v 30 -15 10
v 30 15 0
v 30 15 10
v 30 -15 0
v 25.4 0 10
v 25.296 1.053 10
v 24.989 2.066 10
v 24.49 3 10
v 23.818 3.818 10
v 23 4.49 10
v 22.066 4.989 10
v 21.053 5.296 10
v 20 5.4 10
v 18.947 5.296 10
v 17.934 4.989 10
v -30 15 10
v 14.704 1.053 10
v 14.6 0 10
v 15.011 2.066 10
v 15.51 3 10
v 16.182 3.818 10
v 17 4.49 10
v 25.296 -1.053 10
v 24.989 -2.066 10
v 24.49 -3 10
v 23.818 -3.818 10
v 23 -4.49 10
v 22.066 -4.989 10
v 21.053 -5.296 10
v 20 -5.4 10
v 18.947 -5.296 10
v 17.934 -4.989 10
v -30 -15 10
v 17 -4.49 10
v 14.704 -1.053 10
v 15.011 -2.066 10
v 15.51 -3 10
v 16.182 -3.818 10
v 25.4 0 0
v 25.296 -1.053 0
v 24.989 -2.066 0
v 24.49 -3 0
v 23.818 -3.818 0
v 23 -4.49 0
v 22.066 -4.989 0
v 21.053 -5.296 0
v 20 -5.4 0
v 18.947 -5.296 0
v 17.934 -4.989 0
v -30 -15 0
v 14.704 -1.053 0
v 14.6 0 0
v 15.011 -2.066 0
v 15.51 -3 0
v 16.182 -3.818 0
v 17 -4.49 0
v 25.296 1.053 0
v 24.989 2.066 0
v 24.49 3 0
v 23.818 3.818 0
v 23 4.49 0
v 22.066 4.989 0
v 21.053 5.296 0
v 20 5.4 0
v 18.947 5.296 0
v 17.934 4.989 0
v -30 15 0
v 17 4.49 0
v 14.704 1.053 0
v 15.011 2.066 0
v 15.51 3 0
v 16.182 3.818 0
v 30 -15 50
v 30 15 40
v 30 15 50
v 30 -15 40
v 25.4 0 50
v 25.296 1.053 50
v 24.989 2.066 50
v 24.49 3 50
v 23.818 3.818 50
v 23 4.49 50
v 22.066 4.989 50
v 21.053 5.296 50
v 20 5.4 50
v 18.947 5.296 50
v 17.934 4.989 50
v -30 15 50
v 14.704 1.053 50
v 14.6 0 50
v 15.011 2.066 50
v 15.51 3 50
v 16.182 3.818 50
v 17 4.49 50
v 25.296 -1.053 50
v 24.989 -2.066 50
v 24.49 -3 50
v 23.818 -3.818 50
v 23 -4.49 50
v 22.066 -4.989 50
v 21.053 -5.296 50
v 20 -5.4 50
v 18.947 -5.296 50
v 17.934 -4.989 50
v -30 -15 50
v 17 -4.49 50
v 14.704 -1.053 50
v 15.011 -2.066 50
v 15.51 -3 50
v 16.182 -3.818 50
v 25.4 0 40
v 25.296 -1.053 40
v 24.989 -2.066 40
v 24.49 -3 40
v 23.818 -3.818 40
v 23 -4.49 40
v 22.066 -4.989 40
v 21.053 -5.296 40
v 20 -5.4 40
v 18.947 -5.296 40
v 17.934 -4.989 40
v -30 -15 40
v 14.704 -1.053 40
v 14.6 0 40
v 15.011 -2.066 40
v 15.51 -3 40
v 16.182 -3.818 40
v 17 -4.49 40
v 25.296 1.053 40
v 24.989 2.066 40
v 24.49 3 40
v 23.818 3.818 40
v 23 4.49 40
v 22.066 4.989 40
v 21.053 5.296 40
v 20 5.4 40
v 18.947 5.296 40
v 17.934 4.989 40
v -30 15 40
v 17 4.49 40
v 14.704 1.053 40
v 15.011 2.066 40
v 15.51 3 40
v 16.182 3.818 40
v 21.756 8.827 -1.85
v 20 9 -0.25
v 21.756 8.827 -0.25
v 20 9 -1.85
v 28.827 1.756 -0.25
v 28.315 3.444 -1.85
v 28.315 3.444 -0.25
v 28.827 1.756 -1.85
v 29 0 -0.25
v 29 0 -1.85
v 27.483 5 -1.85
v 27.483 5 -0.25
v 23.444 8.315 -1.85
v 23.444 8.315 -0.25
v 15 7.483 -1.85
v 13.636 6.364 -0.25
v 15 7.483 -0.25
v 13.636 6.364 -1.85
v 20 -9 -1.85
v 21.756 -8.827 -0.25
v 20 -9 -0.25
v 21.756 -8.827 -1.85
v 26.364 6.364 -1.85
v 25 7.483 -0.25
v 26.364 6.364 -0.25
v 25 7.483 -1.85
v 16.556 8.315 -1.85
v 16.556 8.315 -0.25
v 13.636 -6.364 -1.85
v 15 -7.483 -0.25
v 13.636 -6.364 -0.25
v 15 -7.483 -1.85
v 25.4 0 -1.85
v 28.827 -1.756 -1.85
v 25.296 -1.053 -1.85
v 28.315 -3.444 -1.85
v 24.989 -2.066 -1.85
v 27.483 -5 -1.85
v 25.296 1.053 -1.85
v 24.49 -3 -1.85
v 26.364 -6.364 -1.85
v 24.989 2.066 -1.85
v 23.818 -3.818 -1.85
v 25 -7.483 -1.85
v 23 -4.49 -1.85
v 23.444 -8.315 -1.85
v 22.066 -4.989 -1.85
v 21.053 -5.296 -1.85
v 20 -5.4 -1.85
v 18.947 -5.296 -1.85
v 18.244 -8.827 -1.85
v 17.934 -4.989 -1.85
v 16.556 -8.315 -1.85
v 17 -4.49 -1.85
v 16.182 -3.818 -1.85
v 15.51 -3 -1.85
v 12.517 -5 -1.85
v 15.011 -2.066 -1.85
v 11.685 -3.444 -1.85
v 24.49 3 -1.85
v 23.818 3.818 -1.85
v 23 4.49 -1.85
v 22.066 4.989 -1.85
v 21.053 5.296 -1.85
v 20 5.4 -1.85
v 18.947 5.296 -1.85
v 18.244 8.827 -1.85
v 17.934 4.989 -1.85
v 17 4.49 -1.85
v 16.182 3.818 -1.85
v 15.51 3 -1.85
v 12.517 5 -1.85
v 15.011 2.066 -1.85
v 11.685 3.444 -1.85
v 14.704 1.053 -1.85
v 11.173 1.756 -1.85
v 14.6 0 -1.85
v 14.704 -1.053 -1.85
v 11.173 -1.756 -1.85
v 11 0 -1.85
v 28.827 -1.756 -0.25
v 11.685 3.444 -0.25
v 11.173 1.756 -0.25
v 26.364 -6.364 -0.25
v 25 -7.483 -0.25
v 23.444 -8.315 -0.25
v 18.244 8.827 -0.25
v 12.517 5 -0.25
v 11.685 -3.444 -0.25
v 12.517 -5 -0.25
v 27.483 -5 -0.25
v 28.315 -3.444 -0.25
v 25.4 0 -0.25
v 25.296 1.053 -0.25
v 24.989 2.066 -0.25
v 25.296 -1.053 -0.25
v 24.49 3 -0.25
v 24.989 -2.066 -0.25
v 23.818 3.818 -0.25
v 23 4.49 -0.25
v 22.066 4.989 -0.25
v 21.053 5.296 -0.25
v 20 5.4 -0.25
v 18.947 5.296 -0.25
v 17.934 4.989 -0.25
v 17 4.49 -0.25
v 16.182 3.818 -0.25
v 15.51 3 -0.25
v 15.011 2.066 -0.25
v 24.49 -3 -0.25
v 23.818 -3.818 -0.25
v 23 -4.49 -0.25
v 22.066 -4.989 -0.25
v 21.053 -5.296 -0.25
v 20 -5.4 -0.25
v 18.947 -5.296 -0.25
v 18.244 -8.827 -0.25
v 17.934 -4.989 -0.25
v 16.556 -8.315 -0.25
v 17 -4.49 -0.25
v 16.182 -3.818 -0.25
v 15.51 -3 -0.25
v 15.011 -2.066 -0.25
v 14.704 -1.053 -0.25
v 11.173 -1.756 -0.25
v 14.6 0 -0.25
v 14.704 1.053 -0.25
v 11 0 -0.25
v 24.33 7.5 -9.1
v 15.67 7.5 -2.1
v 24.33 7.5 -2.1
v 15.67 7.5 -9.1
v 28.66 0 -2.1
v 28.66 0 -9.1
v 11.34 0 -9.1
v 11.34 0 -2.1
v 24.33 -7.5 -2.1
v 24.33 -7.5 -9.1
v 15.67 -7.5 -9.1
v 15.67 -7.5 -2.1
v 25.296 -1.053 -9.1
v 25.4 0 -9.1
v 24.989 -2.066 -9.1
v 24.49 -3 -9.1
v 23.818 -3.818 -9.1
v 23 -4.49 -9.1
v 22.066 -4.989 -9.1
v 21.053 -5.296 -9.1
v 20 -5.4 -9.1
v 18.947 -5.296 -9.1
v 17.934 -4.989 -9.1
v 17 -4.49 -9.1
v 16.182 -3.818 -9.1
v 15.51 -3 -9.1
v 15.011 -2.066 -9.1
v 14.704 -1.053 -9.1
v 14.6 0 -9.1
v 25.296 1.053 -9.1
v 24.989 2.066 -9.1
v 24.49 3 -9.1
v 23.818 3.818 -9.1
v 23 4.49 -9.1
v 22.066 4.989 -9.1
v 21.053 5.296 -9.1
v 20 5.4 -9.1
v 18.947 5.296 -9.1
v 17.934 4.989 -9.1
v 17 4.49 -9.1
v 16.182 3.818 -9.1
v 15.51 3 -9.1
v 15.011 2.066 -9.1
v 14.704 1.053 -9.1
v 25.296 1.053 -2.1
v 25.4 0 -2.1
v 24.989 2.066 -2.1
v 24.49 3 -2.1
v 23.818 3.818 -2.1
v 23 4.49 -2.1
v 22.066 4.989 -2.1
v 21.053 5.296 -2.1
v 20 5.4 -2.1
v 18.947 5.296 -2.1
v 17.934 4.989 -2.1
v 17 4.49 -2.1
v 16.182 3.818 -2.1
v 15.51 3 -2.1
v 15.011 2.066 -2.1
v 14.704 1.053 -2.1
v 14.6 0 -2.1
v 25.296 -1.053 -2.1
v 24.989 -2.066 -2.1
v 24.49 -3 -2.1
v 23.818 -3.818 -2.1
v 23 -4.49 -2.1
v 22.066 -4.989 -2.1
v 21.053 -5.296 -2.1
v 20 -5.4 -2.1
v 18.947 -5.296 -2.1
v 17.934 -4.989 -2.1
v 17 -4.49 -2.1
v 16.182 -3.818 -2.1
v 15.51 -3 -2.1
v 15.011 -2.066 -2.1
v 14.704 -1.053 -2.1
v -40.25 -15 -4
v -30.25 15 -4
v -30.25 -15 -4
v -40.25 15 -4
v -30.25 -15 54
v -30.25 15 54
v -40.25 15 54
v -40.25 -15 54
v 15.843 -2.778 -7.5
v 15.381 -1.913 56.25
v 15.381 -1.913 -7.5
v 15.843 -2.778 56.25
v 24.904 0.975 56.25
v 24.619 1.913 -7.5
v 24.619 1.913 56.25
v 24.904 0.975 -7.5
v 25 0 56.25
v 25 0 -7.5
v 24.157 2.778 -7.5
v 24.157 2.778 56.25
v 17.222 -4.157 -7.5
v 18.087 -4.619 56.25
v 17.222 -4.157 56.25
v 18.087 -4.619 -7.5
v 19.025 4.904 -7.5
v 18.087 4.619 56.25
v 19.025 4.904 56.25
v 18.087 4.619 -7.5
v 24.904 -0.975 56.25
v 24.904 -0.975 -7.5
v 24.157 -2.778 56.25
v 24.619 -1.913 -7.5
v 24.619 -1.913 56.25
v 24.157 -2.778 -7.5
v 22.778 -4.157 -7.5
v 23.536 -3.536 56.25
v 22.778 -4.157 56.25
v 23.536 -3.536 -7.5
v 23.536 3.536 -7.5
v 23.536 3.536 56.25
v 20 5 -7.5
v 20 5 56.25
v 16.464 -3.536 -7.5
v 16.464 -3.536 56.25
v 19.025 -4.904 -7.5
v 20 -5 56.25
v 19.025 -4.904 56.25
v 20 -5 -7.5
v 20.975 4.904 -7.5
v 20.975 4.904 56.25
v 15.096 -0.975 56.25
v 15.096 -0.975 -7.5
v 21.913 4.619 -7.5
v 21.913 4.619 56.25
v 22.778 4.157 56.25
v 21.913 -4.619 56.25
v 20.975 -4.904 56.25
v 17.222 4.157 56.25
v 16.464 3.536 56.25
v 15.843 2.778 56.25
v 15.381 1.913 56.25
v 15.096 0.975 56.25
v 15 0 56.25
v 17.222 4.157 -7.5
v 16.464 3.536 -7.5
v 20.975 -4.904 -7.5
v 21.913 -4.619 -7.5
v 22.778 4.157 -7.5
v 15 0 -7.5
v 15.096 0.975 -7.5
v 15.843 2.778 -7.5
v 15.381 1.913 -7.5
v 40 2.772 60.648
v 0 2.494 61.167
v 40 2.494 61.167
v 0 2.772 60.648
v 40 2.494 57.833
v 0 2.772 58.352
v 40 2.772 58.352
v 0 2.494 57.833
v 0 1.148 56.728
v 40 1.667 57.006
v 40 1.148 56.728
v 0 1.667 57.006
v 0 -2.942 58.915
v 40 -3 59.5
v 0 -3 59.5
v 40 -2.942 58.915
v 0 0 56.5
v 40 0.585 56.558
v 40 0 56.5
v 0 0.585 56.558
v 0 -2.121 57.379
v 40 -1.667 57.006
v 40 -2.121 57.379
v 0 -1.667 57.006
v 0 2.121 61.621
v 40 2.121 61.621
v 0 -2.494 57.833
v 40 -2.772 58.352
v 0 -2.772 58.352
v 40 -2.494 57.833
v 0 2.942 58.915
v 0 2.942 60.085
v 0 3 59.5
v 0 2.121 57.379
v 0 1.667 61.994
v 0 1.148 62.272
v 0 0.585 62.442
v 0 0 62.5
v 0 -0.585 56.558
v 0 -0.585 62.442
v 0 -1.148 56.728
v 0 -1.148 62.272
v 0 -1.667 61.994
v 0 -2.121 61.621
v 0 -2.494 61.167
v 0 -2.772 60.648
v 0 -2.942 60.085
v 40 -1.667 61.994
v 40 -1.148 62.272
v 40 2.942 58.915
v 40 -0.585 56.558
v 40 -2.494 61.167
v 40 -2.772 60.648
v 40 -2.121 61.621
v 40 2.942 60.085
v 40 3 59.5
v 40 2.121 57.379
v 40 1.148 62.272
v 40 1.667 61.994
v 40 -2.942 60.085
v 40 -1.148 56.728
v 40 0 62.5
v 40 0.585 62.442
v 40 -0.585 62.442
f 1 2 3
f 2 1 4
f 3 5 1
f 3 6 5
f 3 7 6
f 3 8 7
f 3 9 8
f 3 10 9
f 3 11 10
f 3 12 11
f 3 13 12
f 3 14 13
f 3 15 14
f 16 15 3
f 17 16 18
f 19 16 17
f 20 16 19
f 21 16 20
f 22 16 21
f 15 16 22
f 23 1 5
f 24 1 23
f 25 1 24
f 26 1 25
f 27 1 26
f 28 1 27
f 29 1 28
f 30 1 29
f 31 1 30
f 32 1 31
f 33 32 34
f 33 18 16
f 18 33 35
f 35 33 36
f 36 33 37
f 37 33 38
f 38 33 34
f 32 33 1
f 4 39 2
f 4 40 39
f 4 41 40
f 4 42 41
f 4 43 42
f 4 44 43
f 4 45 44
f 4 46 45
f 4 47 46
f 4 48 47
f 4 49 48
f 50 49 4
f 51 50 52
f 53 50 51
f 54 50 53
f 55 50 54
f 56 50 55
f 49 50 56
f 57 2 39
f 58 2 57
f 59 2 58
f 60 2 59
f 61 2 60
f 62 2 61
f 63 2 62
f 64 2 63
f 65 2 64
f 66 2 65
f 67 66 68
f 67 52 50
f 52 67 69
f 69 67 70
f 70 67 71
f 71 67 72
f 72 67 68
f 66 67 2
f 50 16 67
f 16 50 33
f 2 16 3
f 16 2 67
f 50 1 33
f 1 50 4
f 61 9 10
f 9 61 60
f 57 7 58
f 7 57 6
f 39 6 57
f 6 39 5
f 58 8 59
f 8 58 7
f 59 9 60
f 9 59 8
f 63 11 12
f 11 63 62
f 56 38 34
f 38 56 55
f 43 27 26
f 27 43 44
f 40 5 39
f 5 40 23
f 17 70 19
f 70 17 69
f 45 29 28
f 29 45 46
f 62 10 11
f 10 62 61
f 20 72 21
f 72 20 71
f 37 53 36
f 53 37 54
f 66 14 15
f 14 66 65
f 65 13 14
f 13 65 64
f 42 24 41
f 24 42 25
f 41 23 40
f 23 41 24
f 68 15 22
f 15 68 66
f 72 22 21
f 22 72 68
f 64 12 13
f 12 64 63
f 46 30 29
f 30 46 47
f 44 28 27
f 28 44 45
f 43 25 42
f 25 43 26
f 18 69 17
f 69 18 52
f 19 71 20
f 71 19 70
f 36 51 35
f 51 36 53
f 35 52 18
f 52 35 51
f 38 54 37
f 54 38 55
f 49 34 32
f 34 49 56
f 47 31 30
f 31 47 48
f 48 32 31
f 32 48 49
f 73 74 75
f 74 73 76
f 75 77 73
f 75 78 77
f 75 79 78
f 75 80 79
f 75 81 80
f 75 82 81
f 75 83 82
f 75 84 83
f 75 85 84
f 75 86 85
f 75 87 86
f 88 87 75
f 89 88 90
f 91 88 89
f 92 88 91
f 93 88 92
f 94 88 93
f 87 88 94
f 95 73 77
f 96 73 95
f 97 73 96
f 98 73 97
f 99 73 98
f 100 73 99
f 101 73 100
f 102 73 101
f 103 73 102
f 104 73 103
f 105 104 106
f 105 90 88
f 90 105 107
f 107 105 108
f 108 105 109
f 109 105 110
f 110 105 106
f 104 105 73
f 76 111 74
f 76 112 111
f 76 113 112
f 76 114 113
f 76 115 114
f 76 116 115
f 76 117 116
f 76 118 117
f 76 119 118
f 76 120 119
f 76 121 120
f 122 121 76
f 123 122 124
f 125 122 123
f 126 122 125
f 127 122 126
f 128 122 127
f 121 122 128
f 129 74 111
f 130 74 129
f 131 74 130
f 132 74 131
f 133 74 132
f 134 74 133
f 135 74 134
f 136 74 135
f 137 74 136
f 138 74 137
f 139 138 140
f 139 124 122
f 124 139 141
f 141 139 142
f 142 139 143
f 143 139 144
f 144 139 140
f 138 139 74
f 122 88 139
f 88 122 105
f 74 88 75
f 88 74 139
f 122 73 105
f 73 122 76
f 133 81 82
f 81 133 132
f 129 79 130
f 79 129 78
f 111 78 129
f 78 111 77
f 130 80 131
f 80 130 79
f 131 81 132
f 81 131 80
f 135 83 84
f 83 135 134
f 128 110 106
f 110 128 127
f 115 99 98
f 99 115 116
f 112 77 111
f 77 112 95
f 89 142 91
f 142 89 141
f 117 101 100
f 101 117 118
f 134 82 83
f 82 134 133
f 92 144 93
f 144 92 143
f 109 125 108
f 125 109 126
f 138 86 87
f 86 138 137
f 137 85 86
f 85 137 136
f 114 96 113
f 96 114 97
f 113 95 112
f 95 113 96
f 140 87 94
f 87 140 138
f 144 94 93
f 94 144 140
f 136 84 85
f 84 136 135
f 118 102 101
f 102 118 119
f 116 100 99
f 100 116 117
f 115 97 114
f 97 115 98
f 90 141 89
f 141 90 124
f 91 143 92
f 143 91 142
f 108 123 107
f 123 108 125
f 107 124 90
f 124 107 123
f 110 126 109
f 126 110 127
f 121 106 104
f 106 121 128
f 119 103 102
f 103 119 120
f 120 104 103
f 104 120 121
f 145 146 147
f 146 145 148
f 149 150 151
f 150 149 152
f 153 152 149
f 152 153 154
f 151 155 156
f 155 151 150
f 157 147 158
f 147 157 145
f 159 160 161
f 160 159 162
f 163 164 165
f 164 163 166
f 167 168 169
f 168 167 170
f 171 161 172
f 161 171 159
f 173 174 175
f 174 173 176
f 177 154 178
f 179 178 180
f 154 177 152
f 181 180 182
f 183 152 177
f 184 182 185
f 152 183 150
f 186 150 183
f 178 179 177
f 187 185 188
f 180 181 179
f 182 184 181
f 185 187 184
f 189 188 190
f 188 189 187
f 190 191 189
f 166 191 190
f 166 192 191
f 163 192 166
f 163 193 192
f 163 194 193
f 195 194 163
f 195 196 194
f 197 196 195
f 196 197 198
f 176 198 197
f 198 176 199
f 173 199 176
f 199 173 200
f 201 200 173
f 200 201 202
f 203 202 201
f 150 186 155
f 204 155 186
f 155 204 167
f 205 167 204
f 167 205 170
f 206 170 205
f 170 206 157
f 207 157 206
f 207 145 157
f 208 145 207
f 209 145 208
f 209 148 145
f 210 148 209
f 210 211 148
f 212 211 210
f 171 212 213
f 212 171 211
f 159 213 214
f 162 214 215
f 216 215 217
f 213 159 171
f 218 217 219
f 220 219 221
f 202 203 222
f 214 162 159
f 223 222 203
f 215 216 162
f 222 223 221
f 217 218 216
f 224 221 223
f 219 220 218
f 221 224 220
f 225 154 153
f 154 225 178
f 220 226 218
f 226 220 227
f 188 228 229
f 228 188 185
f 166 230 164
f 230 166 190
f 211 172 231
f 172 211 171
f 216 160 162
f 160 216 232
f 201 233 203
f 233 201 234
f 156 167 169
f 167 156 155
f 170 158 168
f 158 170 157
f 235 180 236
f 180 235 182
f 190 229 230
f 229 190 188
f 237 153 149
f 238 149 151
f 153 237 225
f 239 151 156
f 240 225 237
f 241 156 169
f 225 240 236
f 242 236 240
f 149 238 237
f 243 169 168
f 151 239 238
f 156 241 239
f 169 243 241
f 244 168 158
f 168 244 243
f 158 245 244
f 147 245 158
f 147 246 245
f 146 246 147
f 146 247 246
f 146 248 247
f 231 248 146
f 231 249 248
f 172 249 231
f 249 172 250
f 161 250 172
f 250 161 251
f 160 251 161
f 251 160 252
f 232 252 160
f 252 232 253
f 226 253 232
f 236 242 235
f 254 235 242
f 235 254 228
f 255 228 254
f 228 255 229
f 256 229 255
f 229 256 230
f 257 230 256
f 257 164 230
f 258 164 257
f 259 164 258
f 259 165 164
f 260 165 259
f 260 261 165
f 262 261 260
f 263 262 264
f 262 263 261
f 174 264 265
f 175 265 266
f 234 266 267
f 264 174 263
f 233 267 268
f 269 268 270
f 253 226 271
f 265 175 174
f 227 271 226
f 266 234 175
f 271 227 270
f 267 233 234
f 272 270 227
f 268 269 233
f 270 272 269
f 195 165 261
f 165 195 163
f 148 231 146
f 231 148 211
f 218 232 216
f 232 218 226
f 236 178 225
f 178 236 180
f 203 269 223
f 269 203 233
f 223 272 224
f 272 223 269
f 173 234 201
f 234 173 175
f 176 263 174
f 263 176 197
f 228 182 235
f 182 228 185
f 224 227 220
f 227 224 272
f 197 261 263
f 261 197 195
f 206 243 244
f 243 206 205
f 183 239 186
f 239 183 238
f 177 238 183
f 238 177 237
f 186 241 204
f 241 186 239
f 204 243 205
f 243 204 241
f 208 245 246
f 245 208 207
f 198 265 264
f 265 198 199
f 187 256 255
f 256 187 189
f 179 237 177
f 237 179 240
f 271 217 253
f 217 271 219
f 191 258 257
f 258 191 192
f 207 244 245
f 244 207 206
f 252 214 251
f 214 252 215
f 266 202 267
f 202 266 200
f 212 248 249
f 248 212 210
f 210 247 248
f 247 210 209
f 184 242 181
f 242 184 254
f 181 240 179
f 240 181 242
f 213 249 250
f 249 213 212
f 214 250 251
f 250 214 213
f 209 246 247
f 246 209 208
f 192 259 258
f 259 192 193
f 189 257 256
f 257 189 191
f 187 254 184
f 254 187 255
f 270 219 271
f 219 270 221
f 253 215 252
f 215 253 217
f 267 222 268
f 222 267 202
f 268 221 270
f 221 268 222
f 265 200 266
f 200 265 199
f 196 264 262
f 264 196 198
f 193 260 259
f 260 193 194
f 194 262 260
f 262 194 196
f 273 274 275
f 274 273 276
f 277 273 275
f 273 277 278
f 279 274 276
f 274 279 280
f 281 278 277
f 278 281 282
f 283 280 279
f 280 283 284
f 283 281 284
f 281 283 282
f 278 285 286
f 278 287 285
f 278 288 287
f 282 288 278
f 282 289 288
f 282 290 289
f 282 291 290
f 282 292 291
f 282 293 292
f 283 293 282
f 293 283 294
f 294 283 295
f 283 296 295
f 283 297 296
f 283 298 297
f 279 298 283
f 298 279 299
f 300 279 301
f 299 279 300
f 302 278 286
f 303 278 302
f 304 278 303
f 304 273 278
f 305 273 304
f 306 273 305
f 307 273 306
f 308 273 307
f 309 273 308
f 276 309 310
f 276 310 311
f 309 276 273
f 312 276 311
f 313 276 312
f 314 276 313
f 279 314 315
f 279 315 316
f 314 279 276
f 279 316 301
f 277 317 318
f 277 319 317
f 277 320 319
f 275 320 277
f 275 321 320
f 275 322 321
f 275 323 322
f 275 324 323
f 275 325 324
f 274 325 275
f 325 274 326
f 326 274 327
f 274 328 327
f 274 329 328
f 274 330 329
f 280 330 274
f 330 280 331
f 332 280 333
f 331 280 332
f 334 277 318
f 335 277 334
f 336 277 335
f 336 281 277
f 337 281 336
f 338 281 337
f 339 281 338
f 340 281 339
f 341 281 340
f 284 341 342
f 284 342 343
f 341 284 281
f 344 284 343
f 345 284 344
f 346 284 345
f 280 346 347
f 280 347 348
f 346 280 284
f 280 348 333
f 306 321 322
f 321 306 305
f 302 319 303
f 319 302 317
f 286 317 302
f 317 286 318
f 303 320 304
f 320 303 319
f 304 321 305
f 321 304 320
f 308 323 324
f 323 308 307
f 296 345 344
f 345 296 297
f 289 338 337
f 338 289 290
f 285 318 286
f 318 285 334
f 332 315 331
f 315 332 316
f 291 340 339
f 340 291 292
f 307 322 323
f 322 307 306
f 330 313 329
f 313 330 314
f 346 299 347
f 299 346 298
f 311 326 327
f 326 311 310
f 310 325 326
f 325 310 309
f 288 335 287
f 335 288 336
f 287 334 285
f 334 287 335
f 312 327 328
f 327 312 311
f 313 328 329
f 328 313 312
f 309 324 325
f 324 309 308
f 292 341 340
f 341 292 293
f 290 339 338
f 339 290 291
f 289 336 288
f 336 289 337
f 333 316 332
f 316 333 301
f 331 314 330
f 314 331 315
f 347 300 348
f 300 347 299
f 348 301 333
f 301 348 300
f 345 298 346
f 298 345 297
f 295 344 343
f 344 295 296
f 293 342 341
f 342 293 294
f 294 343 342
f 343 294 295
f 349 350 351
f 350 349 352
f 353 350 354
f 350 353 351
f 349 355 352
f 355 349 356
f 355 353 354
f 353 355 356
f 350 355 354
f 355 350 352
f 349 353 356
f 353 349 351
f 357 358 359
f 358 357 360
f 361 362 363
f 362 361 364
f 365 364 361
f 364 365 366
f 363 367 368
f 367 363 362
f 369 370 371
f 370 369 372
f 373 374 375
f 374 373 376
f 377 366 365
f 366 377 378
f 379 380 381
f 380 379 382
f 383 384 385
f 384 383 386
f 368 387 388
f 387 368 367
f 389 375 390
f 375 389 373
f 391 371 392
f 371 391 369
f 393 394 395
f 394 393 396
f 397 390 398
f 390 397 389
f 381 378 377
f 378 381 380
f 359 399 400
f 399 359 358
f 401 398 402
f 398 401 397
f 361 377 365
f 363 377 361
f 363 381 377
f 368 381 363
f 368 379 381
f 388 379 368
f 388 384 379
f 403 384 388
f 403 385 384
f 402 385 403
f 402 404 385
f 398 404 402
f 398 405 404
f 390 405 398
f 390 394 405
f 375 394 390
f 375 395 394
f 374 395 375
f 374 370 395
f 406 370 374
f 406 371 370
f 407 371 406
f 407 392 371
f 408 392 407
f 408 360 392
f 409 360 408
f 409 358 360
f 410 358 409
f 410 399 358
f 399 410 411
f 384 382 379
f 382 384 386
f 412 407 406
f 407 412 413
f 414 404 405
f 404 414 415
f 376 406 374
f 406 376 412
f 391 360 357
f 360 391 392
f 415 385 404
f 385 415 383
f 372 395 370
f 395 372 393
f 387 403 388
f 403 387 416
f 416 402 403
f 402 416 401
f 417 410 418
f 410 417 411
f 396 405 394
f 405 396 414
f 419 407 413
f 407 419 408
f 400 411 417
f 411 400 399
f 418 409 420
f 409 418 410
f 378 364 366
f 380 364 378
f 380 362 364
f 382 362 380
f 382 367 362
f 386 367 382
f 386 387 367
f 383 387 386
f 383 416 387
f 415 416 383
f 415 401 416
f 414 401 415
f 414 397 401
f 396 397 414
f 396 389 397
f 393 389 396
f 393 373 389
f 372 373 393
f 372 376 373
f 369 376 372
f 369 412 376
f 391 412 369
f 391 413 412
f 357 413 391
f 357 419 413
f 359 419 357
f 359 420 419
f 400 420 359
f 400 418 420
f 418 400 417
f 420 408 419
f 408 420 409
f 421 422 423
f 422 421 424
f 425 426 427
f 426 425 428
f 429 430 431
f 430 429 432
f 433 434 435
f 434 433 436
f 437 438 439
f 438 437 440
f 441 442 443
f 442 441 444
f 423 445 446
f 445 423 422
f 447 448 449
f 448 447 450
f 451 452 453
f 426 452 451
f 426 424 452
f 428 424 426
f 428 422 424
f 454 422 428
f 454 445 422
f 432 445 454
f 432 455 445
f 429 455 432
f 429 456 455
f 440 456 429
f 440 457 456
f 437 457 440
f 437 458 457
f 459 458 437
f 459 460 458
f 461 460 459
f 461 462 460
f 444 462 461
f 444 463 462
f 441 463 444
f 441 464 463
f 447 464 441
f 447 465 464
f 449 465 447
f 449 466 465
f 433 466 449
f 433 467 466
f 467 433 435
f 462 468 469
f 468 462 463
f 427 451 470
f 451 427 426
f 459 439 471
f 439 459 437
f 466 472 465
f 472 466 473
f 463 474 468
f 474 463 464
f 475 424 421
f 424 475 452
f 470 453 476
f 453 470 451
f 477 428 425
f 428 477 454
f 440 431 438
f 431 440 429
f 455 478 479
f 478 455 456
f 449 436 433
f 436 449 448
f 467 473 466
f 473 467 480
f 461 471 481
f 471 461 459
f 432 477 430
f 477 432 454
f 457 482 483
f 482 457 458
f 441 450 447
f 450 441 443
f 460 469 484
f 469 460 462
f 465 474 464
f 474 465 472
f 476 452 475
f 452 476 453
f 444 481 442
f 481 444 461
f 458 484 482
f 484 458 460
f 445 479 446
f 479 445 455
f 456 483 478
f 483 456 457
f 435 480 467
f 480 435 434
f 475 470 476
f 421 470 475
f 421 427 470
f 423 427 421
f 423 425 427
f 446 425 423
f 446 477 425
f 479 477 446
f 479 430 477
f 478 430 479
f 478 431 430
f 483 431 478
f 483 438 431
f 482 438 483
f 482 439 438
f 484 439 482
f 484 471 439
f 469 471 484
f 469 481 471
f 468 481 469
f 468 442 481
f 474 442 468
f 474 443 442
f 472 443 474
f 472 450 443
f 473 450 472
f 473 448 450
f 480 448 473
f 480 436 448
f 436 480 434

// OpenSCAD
$fn = 32;

// ------------------------------------------------------------------------
// C clamp: throat 40 mm, screw d10
// Every part is its own module, assembly() places every instance.
// ------------------------------------------------------------------------

// --- part 1 ---
module clamp_arm() {
  difference() {
    translate([-30, -15, 0]) cube([60, 30, 10]);
    translate([20, 0, -1]) cylinder(h = 12, d = 10.8);
  }
}

// --- part 2 ---
module clamp_spine() {
  difference() {
    translate([-29, -15, 0]) cube([58, 30, 10]);
  }
}

// --- part 3 ---
module clamp_screw() {
  translate([0, 0, -31.875]) cylinder(h = 63.75, d = 10);
}

// --- part 4 ---
module clamp_washer() {
  difference() {
      translate([0, 0, 0]) cylinder(h = 1.6, d = 18);
      translate([0, 0, -1]) cylinder(h = 3.6, d = 10.8);
    }
}

// --- part 5 ---
module clamp_nut() {
  difference() {
    linear_extrude(height = 7) polygon(points = [[8.66, 0], [4.33, 7.5], [-4.33, 7.5], [-8.66, 0], [-4.33, -7.5], [4.33, -7.5]]);
    translate([0, 0, -1]) cylinder(h = 9, d = 10.8);
  }
}

// --- part 6 ---
module tommy_bar() {
  translate([0, 0, -20]) cylinder(h = 40, d = 6);
}

// --- assembly ---
module assembly() {
  color([0.80, 0.24, 0.20]) translate([0, 0, 0]) rotate([0, 0, 0]) clamp_arm();
  color([0.20, 0.45, 0.75]) translate([0, 0, 40]) rotate([0, 0, 0]) clamp_arm();
  color([0.25, 0.62, 0.32]) translate([-40.25, 0, 25]) rotate([0, 90, 0]) clamp_spine();
  color([0.92, 0.70, 0.18]) translate([20, 0, 24.375]) rotate([0, 0, 0]) clamp_screw();
  color([0.58, 0.35, 0.70]) translate([20, 0, -1.85]) rotate([0, 0, 0]) clamp_washer();
  color([0.16, 0.66, 0.66]) translate([20, 0, -9.1]) rotate([0, 0, 0]) clamp_nut();
  color([0.85, 0.48, 0.18]) translate([20, 0, 59.5]) rotate([0, 90, 0]) tommy_bar();
}

assembly();
